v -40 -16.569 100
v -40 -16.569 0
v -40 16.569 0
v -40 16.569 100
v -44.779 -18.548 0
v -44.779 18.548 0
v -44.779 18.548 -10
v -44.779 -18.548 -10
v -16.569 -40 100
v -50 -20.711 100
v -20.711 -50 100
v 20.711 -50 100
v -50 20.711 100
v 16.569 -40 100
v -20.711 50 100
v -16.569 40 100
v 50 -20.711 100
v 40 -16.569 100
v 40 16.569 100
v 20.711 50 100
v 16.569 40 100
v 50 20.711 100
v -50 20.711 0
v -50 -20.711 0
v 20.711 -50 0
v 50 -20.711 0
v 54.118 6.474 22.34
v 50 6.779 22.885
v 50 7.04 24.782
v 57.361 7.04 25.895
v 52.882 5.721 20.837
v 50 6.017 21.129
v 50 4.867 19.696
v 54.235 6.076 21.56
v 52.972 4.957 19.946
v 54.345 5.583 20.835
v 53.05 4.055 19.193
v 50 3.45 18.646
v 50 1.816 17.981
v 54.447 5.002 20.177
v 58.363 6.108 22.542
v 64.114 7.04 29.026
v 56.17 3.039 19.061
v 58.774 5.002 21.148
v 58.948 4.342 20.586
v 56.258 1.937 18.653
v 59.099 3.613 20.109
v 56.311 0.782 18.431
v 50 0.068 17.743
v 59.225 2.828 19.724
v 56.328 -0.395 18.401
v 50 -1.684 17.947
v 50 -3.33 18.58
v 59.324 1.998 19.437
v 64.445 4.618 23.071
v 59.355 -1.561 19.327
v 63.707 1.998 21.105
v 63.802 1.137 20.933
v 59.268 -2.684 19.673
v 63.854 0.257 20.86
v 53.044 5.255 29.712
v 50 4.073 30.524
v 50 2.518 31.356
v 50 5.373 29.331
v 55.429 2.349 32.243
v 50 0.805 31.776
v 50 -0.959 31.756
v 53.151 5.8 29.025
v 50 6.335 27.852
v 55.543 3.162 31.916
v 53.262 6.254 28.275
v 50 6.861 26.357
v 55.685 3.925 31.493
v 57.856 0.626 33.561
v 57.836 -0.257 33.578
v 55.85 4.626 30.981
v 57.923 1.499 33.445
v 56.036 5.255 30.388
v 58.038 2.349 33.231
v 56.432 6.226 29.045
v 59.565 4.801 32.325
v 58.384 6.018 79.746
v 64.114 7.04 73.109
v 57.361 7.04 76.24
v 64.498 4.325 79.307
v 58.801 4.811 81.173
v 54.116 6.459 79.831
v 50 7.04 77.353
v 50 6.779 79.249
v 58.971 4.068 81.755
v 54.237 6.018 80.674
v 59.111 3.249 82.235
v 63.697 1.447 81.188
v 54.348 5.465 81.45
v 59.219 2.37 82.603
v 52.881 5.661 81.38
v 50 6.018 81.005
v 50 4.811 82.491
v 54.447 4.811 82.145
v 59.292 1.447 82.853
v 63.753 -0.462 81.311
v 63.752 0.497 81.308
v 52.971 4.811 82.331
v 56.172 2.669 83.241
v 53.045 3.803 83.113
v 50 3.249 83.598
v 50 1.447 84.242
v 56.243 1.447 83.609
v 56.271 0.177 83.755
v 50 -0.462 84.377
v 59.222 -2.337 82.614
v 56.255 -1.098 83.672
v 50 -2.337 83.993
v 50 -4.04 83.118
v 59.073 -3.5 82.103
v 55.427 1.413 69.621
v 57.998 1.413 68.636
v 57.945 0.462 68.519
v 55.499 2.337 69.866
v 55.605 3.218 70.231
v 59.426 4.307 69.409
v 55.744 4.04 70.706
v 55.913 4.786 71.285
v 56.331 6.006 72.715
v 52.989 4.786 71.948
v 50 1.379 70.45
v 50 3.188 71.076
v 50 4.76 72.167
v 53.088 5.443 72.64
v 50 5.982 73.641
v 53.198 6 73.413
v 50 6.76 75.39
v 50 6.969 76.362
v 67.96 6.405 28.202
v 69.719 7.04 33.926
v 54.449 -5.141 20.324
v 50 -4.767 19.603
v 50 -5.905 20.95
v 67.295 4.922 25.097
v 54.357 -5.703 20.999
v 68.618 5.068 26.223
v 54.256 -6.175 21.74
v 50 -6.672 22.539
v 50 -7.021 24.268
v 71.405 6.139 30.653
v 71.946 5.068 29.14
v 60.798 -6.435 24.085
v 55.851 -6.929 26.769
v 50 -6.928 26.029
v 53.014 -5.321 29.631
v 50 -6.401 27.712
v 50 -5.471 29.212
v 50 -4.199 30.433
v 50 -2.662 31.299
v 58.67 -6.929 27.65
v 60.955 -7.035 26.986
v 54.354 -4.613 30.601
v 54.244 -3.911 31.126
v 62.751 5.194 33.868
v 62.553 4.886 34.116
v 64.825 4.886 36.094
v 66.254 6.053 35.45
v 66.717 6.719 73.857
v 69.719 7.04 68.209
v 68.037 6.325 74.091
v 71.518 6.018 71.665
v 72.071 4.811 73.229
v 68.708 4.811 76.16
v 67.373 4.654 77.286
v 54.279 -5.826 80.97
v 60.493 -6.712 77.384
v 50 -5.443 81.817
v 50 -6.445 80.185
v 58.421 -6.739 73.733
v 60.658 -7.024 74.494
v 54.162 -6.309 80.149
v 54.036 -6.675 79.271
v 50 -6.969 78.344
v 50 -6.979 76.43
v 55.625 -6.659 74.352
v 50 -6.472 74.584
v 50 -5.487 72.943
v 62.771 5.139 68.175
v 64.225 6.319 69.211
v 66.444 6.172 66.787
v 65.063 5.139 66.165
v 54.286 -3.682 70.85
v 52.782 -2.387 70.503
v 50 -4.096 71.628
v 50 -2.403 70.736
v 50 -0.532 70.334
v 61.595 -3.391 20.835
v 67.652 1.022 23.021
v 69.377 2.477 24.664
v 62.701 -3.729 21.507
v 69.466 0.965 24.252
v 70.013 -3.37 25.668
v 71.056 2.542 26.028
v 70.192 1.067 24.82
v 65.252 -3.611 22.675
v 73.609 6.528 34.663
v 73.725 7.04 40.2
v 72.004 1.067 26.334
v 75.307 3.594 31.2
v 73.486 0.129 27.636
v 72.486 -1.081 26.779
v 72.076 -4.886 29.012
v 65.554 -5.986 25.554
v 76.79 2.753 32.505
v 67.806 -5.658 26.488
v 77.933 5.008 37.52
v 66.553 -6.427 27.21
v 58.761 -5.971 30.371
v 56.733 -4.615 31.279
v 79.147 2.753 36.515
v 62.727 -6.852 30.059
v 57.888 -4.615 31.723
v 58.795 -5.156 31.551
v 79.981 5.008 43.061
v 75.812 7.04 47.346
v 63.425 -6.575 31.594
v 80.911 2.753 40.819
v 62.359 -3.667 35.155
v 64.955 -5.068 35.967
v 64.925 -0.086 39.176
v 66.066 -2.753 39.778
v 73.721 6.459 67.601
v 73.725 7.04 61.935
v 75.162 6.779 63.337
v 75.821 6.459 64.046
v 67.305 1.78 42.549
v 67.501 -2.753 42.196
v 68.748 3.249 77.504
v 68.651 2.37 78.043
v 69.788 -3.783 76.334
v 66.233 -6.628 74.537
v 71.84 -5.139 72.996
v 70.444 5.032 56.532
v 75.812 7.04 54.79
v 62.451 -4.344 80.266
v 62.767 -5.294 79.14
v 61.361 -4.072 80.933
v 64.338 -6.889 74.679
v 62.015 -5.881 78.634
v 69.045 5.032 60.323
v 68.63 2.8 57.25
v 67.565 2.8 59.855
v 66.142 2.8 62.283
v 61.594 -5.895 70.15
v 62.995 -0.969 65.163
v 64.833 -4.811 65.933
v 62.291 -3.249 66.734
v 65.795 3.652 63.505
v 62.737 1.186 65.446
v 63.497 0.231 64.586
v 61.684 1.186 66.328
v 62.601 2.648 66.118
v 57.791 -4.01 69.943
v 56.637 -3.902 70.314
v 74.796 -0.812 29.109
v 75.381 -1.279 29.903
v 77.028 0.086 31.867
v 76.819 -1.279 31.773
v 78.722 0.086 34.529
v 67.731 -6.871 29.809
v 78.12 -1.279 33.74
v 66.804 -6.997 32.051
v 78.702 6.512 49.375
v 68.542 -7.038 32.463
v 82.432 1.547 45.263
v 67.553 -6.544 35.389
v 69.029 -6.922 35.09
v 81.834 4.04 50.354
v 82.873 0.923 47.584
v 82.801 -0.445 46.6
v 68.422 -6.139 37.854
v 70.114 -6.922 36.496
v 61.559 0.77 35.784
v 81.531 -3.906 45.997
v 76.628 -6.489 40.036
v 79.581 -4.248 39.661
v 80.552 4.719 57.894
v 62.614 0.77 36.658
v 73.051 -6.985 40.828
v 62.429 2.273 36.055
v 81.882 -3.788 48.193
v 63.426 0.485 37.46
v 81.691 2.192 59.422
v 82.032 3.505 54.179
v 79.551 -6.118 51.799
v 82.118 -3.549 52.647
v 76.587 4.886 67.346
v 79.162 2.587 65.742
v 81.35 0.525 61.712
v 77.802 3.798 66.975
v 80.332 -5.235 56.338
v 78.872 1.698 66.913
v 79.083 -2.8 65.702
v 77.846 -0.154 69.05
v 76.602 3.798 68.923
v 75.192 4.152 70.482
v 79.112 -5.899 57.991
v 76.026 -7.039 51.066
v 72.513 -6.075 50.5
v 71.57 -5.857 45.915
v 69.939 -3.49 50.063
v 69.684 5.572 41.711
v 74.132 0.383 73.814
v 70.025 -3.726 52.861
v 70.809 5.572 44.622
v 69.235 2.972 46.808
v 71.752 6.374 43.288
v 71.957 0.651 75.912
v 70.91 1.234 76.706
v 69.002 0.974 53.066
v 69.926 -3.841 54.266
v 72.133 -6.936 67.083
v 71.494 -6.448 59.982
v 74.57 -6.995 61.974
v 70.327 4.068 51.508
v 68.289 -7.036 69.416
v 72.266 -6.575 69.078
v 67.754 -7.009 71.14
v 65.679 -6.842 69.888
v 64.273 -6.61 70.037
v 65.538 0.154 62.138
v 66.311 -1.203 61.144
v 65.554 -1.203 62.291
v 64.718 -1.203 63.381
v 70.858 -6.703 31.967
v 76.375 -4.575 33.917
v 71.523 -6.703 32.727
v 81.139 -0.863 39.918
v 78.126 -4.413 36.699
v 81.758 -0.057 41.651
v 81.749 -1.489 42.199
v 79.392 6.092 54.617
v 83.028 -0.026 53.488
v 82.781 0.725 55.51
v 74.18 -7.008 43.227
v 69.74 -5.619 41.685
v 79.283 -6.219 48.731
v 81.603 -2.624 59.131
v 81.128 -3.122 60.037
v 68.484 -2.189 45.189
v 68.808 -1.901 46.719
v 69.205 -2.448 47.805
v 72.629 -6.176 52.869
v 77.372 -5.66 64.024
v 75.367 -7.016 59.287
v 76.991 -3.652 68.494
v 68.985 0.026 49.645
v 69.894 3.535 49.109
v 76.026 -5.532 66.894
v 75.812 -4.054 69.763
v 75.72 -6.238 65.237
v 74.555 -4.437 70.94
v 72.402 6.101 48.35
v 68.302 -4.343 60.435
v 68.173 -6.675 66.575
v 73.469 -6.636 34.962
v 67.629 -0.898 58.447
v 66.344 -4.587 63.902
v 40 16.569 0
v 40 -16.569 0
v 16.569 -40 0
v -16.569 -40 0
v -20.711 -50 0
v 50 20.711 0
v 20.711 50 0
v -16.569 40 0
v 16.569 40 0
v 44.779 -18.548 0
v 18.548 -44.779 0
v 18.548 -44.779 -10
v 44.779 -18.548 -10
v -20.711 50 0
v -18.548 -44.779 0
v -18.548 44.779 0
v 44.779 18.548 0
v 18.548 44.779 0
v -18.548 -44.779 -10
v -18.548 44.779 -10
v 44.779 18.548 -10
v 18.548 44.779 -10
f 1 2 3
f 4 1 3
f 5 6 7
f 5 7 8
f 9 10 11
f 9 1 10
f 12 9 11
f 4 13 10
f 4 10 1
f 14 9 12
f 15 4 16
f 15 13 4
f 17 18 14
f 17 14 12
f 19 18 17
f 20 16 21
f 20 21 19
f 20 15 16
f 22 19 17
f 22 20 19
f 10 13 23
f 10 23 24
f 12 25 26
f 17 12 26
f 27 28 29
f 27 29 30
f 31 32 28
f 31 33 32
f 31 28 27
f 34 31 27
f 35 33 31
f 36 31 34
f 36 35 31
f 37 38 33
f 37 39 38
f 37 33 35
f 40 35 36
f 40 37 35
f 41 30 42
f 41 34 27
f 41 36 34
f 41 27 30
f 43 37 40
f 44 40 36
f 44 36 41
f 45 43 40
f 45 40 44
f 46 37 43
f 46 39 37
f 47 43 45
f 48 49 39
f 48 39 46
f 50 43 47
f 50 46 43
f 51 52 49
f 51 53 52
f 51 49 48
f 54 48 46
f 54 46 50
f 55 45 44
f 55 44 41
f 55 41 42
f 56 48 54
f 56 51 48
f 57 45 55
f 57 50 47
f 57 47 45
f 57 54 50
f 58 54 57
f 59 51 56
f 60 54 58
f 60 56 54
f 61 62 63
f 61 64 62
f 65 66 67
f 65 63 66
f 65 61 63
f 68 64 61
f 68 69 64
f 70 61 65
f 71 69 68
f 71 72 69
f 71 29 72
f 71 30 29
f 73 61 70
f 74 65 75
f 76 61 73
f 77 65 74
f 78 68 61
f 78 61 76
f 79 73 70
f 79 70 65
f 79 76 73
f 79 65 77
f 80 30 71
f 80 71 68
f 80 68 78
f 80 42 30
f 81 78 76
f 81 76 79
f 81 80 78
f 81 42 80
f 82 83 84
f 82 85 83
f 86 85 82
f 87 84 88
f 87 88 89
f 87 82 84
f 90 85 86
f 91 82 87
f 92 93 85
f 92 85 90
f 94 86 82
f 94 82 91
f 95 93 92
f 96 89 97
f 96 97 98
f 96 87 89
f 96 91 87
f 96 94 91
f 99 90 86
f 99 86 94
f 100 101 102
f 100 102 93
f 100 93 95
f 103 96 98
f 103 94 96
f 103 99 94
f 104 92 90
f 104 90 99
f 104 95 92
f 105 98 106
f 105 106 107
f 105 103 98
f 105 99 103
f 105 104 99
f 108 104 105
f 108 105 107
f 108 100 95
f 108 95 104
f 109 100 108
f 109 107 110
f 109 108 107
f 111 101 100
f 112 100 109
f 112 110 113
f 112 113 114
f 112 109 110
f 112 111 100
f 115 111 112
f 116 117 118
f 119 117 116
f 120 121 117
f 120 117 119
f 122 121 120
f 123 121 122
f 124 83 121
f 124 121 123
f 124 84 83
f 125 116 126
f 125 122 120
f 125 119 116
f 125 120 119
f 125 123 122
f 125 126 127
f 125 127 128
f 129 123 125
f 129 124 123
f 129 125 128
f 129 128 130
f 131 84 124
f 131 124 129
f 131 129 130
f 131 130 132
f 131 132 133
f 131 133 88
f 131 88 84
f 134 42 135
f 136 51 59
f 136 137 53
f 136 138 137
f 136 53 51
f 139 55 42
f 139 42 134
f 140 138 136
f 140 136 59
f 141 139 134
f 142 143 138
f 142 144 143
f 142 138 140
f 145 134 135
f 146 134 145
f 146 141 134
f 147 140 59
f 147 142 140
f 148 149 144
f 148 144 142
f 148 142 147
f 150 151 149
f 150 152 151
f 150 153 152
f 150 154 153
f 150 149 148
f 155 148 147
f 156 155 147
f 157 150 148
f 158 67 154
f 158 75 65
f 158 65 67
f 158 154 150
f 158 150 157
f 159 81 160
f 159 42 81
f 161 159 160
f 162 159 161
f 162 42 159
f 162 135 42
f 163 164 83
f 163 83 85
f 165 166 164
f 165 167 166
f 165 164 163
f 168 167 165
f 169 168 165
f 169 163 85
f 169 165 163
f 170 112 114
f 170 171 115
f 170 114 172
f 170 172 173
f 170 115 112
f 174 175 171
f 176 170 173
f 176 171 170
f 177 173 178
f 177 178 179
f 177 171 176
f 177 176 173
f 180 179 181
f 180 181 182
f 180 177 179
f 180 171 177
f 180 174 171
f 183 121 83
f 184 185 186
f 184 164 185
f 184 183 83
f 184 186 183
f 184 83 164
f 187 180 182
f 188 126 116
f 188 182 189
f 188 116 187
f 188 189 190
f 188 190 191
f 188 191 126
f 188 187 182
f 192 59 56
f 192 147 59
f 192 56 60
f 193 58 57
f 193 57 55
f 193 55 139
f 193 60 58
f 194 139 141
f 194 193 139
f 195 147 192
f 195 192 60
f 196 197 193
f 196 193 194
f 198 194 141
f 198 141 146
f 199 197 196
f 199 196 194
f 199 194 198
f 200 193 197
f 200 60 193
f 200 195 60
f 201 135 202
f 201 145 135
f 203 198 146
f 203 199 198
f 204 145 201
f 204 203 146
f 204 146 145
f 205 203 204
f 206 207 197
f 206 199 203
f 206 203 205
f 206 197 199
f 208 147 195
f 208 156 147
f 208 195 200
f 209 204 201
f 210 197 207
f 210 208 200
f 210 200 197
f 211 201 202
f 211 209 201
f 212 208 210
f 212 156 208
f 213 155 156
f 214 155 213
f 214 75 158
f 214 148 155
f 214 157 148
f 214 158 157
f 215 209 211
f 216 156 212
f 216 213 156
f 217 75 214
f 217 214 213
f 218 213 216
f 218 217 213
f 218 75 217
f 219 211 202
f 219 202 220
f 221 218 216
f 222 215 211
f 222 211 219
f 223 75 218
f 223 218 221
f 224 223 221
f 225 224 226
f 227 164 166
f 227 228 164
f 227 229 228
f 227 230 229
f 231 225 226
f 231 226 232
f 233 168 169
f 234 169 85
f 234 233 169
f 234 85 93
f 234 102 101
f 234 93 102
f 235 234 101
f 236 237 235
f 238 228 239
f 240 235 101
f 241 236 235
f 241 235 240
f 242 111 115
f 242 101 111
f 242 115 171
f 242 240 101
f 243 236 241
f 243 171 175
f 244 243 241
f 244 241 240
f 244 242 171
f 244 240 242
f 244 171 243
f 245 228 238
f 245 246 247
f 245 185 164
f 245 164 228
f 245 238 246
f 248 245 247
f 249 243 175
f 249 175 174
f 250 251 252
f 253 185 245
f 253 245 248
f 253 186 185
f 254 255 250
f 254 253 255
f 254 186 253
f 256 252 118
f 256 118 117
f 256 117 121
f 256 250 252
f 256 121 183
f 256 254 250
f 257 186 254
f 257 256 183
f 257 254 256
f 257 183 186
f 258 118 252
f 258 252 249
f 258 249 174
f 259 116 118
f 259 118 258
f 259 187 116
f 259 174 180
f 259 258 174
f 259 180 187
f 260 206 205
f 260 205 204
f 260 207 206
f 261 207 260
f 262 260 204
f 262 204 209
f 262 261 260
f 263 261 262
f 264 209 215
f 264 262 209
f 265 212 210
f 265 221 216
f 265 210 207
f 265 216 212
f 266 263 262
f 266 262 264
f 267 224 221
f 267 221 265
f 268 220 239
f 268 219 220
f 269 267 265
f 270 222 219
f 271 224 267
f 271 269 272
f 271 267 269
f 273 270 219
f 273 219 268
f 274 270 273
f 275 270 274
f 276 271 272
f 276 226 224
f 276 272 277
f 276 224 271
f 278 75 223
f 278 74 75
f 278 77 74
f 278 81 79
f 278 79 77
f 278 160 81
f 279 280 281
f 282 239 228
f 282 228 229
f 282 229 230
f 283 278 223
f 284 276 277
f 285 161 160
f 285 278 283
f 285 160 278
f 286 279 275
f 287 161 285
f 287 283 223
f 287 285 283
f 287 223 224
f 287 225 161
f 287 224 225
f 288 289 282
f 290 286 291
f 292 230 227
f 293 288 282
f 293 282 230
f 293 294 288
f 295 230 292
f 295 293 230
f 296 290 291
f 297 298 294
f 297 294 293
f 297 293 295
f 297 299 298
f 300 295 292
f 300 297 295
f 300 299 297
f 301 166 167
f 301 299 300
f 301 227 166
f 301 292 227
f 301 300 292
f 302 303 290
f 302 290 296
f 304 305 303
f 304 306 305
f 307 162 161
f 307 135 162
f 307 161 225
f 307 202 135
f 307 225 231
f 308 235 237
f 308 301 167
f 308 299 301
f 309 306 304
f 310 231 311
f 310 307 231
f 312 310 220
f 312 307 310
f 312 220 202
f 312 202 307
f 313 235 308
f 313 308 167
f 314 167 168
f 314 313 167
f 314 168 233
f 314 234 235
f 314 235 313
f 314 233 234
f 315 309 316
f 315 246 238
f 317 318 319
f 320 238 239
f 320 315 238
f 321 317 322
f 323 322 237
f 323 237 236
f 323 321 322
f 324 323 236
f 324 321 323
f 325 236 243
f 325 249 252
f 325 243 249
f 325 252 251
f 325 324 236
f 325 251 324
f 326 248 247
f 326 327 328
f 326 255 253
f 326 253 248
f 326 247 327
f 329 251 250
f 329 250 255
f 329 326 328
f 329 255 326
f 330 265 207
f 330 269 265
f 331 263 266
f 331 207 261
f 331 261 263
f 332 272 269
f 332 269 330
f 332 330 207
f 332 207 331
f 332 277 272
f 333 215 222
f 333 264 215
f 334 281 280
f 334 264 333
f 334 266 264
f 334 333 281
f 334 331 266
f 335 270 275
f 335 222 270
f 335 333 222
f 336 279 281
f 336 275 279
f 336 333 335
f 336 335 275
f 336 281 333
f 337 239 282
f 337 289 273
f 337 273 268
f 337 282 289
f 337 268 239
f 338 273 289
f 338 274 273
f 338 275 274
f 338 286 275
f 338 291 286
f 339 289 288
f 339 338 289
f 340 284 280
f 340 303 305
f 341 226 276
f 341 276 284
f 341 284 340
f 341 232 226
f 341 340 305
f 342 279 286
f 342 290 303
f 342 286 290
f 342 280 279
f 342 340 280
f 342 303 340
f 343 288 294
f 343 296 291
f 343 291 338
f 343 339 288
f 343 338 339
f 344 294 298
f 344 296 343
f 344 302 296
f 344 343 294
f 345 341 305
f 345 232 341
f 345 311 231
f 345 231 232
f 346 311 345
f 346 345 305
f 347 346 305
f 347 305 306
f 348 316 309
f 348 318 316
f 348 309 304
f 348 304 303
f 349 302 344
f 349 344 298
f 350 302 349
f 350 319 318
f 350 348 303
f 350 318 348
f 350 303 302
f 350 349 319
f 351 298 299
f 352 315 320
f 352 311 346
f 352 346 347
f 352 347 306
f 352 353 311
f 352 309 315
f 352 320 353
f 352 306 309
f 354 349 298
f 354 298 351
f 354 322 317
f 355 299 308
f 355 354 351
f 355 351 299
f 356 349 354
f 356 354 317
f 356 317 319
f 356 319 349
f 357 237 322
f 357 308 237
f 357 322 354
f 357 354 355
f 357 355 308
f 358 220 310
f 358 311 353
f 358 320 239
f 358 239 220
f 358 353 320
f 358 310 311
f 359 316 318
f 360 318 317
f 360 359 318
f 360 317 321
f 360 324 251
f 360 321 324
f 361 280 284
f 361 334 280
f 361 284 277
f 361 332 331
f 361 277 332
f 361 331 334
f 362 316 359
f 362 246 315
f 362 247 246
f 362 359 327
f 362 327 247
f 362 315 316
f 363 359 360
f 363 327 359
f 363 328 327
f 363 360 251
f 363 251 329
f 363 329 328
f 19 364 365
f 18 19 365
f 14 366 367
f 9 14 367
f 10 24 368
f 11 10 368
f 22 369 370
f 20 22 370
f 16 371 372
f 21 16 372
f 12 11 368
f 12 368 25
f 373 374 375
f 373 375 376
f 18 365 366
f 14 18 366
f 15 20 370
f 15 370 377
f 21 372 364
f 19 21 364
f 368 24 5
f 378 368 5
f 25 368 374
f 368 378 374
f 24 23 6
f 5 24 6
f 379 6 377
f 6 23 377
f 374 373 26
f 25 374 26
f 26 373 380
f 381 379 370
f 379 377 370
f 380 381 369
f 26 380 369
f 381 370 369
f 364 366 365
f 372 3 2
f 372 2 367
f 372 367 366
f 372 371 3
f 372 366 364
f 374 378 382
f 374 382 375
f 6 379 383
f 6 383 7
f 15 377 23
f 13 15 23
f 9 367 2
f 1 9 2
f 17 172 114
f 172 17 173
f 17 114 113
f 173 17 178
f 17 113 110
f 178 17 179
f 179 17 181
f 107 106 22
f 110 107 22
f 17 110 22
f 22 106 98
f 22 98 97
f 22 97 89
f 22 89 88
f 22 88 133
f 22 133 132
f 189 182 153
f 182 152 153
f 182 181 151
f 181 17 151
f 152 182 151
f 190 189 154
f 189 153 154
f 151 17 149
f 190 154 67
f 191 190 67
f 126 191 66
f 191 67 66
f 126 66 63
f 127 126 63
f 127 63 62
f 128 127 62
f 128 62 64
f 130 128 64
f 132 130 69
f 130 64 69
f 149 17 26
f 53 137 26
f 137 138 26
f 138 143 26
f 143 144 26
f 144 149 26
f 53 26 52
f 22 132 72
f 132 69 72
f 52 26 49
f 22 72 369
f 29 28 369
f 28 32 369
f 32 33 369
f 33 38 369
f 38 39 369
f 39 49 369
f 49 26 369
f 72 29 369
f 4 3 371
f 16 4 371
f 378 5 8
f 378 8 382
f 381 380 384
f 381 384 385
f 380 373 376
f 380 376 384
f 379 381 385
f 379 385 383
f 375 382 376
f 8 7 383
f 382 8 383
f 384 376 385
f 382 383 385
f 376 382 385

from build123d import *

# Parameters (mm, degrees)
F1_DEPTH = 100
F2_R     = 7.0395
F6_DEPTH = 10


with BuildPart() as f1:
    # F0 (on Top) → F1 (new body)
    with BuildSketch(Plane.XY):
        Polygon((20.710678, 50), (-20.710678, 50), (-50, 20.710678), (-50, -20.710678), (-20.710678, -50), (20.710678, -50), (50, -20.710678), (50, -9.2725), (50, 9.2725), (50, 20.710678), align=None)
        Polygon((-40, 16.568542), (-16.568542, 40), (16.568542, 40), (40, 16.568542), (40, -16.568542), (16.568542, -40), (-16.568542, -40), (-40, -16.568542), align=None, mode=Mode.SUBTRACT)
    extrude(amount=F1_DEPTH)

    # F4: sweep along a path in F3
    with BuildLine(Plane.XZ) as f4_path:
        ThreePointArc((49.790855, 24.170094), (76.688355, 51.067594), (49.790855, 77.965094))
    # F2 (on face) → F4 (sweep)
    with BuildSketch(Plane.YZ.offset(50)):
        with Locations((0, 77.352941)):
            Circle(F2_R)
    sweep(path=f4_path.line)

    # F5 (on Top) → F6 (join)
    with BuildSketch(Plane.XY):
        Polygon((-18.548241, -44.779416), (18.548241, -44.779416), (44.779416, -18.548241), (44.779416, 18.548241), (18.548241, 44.779416), (-18.548241, 44.779416), (-44.779416, 18.548241), (-44.779416, -18.548241), align=None)
    extrude(amount=-F6_DEPTH)


solid = f1.part
